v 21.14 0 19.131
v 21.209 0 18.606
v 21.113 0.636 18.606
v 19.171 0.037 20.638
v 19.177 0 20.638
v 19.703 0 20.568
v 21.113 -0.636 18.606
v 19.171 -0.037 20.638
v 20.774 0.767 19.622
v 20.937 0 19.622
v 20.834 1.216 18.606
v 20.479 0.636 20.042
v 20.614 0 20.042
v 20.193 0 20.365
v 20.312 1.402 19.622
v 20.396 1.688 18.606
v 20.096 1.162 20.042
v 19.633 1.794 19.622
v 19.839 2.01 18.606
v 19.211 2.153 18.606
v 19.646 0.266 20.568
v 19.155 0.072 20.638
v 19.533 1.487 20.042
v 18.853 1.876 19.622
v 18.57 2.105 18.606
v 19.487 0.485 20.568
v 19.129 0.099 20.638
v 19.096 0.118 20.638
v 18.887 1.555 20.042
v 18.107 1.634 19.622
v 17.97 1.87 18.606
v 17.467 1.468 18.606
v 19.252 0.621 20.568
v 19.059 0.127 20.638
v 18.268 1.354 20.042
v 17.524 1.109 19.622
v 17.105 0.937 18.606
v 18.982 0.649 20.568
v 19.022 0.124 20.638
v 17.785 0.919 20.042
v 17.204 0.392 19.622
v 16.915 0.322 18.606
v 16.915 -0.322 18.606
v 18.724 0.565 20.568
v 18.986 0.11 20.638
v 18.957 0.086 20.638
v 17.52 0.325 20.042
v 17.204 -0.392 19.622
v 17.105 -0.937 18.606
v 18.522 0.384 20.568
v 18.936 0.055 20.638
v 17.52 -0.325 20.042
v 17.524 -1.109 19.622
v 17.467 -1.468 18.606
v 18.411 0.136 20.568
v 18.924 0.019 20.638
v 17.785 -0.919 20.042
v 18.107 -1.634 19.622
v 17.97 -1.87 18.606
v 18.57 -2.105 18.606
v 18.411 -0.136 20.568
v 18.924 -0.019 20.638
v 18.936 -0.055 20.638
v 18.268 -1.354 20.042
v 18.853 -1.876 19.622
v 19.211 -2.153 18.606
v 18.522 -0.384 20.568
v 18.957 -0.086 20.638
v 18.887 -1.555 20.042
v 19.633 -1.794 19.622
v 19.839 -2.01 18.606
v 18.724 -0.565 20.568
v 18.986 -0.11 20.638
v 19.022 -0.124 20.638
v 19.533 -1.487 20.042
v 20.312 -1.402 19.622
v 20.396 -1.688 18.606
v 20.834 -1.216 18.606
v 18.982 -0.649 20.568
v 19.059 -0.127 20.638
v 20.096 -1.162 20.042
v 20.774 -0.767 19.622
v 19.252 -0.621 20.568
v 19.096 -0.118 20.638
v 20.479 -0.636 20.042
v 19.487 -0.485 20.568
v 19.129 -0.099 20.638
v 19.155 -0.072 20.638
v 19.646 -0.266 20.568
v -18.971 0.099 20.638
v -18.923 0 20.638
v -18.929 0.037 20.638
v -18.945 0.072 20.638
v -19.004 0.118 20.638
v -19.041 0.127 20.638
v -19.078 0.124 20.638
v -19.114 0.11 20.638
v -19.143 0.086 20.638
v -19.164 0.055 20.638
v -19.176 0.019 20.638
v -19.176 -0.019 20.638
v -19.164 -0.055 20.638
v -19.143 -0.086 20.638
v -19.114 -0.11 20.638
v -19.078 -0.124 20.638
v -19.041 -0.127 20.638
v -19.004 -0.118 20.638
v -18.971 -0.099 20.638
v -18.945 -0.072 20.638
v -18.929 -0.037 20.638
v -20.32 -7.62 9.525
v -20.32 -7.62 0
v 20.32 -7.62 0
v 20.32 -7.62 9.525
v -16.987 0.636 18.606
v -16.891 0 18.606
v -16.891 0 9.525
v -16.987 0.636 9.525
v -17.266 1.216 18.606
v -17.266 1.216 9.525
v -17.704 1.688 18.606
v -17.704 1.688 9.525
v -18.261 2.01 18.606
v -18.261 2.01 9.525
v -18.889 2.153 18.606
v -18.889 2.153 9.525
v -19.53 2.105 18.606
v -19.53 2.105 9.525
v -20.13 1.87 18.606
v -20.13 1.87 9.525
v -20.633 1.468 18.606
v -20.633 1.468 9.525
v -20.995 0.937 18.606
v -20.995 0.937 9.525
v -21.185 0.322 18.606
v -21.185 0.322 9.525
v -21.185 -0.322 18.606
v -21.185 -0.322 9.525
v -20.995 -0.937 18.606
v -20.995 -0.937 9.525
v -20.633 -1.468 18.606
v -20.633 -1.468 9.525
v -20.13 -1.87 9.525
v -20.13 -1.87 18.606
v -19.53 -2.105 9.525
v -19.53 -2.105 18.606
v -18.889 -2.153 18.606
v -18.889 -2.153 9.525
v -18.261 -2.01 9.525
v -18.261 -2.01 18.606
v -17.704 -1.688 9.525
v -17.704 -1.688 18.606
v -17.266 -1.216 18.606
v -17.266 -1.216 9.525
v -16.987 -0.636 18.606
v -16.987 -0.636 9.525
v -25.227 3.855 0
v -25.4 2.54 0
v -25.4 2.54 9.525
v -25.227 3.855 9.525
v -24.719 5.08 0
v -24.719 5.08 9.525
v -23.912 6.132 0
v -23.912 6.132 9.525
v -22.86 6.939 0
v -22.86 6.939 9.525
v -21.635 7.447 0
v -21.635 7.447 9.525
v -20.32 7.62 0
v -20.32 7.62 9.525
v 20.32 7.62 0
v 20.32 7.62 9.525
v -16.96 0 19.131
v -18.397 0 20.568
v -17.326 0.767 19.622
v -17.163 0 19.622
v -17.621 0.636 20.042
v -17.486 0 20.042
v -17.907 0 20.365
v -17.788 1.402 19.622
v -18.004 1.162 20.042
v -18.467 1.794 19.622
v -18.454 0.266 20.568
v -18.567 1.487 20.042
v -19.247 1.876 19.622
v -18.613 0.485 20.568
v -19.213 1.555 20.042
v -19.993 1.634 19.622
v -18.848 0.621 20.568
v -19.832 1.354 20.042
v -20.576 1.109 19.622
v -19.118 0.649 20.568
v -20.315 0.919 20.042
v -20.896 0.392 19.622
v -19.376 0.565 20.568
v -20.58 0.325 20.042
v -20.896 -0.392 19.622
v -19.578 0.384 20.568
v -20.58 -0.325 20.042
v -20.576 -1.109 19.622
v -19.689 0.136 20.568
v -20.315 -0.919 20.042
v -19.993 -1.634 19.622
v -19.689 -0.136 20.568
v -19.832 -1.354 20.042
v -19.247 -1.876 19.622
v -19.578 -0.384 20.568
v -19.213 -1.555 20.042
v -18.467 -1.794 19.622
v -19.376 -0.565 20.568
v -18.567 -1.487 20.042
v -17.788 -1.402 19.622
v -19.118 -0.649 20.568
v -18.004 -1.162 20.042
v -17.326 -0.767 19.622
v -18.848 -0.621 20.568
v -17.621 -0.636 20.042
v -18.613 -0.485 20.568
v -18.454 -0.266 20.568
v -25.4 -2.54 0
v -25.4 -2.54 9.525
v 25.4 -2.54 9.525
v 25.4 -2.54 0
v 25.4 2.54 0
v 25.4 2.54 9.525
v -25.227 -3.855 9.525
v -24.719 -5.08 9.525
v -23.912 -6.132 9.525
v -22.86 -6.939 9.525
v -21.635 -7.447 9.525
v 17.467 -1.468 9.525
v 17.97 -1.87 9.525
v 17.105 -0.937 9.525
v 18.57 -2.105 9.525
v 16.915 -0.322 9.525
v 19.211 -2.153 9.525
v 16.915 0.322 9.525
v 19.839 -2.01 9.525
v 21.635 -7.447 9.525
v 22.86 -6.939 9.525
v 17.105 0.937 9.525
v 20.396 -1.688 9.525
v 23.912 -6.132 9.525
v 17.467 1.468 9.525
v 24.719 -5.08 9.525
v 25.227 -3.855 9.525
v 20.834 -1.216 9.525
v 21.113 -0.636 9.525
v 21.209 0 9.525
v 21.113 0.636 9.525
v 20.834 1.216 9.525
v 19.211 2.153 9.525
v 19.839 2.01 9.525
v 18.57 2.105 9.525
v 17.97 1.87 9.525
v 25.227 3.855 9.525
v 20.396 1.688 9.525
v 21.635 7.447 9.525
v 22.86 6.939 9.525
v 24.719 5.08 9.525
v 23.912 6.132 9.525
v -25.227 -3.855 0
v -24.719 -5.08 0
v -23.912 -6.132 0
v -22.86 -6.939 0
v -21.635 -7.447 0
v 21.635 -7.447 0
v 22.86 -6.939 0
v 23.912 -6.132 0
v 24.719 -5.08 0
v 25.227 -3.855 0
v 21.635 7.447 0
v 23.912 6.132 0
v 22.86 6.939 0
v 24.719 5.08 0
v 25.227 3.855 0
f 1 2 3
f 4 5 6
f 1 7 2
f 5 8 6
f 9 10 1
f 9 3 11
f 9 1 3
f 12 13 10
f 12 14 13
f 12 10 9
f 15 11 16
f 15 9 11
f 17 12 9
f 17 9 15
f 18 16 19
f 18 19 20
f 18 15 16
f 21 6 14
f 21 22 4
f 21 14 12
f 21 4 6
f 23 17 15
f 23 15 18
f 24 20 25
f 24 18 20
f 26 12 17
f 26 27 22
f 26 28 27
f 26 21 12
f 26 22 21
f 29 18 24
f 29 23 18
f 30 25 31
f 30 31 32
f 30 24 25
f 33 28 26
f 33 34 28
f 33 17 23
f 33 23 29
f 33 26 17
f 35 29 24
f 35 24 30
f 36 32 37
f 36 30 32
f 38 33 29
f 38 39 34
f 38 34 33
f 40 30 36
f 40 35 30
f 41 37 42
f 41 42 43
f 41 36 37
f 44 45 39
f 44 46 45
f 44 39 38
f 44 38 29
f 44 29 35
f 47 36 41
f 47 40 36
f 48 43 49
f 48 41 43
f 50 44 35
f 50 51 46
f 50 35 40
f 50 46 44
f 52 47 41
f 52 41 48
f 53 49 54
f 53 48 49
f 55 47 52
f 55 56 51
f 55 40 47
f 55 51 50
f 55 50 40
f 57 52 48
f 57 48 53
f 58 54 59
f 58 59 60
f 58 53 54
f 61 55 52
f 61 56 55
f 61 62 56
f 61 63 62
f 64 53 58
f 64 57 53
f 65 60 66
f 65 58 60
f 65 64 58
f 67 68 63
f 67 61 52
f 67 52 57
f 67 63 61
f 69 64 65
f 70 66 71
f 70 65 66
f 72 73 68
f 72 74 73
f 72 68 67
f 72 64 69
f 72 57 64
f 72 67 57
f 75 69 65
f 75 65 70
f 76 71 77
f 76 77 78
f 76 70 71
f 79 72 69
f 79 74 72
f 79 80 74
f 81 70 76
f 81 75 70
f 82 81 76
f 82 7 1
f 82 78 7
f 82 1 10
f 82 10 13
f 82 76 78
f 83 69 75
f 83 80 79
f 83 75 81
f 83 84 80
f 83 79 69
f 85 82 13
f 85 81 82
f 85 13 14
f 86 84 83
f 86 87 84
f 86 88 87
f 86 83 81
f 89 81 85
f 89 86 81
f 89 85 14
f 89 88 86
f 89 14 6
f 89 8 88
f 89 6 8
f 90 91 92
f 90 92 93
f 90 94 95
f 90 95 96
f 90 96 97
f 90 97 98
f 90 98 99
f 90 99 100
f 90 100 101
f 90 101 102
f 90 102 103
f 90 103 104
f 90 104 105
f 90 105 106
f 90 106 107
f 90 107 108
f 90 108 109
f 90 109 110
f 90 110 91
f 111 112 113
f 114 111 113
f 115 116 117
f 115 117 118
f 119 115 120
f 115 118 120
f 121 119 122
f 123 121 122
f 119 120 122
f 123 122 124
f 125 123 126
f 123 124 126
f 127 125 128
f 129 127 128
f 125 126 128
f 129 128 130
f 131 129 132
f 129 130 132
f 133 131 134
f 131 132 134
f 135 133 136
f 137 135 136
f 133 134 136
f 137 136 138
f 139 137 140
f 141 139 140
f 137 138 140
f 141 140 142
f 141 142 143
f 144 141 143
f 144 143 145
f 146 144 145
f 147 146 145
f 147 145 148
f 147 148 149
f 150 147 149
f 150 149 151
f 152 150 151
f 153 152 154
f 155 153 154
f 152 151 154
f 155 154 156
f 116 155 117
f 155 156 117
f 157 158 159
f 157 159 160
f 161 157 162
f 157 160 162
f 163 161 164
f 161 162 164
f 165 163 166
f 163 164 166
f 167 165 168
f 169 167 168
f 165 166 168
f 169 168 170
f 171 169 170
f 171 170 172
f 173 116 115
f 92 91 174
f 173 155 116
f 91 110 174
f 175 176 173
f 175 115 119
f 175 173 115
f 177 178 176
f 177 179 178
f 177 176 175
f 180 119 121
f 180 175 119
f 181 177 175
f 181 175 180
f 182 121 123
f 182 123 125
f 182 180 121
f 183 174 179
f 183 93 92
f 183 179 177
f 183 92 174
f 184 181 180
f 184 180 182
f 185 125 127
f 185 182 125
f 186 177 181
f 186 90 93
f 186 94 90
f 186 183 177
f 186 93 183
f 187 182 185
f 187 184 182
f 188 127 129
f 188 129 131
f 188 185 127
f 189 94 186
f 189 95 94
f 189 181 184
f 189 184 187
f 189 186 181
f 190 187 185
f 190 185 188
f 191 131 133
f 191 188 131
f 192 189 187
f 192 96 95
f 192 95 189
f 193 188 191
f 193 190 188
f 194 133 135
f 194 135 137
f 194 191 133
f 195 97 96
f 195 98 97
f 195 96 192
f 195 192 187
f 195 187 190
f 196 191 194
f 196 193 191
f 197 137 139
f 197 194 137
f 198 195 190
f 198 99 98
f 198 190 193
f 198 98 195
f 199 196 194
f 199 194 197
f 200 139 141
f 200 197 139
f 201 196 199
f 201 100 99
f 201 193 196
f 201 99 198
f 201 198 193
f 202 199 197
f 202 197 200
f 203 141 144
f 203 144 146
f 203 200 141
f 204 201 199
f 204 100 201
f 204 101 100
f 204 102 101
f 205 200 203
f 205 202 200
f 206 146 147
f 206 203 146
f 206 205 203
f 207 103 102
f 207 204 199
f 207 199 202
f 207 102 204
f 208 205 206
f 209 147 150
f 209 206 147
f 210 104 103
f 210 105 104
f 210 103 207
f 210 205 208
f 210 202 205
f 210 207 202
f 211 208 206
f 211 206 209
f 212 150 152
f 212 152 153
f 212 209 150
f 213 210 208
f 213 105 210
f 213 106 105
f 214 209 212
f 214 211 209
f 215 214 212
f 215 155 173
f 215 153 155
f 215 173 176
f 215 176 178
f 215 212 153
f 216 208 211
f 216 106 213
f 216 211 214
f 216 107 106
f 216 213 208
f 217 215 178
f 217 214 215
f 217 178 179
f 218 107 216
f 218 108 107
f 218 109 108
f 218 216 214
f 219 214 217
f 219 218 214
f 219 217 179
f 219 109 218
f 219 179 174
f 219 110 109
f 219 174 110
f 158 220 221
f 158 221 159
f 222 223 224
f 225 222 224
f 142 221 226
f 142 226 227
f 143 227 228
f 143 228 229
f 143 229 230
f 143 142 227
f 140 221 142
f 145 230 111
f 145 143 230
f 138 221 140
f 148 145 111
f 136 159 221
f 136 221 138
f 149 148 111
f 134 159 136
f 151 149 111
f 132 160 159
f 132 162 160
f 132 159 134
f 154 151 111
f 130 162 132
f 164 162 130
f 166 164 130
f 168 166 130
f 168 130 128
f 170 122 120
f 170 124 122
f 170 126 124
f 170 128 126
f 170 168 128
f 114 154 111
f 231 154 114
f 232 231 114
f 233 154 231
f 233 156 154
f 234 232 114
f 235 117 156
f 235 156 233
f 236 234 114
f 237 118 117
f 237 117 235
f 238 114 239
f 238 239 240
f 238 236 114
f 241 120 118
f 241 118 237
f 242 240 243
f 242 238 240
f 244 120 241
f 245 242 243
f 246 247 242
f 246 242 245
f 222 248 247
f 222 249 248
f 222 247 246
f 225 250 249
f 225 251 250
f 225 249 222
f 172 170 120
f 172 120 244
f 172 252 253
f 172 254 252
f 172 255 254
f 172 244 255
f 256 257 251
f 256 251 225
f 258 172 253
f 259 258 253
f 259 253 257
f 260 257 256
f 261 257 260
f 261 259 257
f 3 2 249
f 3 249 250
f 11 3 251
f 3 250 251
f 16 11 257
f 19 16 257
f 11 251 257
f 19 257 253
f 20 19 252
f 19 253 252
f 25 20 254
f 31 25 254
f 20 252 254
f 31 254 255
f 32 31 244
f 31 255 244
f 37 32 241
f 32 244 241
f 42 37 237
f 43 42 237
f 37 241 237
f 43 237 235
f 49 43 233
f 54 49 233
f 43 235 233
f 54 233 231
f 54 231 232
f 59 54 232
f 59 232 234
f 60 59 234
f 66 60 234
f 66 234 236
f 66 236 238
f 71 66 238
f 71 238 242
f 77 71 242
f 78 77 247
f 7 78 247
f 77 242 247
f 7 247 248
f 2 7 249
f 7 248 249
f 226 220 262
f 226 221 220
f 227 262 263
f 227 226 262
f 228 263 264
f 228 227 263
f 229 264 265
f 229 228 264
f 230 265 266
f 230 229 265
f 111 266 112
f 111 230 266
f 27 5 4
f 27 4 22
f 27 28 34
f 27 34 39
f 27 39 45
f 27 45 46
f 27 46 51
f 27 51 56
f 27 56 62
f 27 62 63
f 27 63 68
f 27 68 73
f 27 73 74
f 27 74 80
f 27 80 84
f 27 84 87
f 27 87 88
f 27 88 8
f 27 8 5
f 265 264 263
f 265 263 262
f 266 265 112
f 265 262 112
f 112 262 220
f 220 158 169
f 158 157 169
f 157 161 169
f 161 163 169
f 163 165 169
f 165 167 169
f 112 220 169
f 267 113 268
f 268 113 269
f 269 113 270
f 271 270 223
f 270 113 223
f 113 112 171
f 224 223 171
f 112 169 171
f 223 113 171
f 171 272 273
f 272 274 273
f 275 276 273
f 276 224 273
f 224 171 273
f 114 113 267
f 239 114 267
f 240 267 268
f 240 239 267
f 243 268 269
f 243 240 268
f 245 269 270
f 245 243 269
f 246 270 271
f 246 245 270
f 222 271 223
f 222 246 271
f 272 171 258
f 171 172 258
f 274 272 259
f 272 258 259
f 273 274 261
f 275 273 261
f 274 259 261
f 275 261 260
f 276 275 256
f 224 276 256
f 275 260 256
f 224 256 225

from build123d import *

# Parameters (mm, degrees)
F0_W     = 50.8
F0_H     = 15.24
F1_DEPTH = 9.525
F2_R     = 2.159
F3_DEPTH = 11.1125
F4_R     = 2.032
F5_R     = 5.08


with BuildPart() as f1:
    # F0 (on Top) → F1 (new body)
    with BuildSketch(Plane.XY):
        Rectangle(F0_W, F0_H)
    extrude(amount=F1_DEPTH)

    # F2 (on face) → F3 (join)
    with BuildSketch(Plane.XY.offset(9.525)):
        with Locations((-19.05, 0)):
            Circle(F2_R)
        with Locations((19.05, 0)):
            Circle(F2_R)
    extrude(amount=F3_DEPTH)

    # F4
    f4_edges = [f1.edges().sort_by_distance(p)[0] for p in [
        (-21.209, 0, 20.6375),
        (16.891, 0, 20.6375),
    ]]
    fillet(f4_edges, radius=F4_R)

    # F5
    f5_edges = [f1.edges().sort_by_distance(p)[0] for p in [
        (-25.4, -7.62, 4.7625),
        (25.4, -7.62, 4.7625),
        (25.4, 7.62, 4.7625),
        (-25.4, 7.62, 4.7625),
    ]]
    fillet(f5_edges, radius=F5_R)


solid = f1.part
